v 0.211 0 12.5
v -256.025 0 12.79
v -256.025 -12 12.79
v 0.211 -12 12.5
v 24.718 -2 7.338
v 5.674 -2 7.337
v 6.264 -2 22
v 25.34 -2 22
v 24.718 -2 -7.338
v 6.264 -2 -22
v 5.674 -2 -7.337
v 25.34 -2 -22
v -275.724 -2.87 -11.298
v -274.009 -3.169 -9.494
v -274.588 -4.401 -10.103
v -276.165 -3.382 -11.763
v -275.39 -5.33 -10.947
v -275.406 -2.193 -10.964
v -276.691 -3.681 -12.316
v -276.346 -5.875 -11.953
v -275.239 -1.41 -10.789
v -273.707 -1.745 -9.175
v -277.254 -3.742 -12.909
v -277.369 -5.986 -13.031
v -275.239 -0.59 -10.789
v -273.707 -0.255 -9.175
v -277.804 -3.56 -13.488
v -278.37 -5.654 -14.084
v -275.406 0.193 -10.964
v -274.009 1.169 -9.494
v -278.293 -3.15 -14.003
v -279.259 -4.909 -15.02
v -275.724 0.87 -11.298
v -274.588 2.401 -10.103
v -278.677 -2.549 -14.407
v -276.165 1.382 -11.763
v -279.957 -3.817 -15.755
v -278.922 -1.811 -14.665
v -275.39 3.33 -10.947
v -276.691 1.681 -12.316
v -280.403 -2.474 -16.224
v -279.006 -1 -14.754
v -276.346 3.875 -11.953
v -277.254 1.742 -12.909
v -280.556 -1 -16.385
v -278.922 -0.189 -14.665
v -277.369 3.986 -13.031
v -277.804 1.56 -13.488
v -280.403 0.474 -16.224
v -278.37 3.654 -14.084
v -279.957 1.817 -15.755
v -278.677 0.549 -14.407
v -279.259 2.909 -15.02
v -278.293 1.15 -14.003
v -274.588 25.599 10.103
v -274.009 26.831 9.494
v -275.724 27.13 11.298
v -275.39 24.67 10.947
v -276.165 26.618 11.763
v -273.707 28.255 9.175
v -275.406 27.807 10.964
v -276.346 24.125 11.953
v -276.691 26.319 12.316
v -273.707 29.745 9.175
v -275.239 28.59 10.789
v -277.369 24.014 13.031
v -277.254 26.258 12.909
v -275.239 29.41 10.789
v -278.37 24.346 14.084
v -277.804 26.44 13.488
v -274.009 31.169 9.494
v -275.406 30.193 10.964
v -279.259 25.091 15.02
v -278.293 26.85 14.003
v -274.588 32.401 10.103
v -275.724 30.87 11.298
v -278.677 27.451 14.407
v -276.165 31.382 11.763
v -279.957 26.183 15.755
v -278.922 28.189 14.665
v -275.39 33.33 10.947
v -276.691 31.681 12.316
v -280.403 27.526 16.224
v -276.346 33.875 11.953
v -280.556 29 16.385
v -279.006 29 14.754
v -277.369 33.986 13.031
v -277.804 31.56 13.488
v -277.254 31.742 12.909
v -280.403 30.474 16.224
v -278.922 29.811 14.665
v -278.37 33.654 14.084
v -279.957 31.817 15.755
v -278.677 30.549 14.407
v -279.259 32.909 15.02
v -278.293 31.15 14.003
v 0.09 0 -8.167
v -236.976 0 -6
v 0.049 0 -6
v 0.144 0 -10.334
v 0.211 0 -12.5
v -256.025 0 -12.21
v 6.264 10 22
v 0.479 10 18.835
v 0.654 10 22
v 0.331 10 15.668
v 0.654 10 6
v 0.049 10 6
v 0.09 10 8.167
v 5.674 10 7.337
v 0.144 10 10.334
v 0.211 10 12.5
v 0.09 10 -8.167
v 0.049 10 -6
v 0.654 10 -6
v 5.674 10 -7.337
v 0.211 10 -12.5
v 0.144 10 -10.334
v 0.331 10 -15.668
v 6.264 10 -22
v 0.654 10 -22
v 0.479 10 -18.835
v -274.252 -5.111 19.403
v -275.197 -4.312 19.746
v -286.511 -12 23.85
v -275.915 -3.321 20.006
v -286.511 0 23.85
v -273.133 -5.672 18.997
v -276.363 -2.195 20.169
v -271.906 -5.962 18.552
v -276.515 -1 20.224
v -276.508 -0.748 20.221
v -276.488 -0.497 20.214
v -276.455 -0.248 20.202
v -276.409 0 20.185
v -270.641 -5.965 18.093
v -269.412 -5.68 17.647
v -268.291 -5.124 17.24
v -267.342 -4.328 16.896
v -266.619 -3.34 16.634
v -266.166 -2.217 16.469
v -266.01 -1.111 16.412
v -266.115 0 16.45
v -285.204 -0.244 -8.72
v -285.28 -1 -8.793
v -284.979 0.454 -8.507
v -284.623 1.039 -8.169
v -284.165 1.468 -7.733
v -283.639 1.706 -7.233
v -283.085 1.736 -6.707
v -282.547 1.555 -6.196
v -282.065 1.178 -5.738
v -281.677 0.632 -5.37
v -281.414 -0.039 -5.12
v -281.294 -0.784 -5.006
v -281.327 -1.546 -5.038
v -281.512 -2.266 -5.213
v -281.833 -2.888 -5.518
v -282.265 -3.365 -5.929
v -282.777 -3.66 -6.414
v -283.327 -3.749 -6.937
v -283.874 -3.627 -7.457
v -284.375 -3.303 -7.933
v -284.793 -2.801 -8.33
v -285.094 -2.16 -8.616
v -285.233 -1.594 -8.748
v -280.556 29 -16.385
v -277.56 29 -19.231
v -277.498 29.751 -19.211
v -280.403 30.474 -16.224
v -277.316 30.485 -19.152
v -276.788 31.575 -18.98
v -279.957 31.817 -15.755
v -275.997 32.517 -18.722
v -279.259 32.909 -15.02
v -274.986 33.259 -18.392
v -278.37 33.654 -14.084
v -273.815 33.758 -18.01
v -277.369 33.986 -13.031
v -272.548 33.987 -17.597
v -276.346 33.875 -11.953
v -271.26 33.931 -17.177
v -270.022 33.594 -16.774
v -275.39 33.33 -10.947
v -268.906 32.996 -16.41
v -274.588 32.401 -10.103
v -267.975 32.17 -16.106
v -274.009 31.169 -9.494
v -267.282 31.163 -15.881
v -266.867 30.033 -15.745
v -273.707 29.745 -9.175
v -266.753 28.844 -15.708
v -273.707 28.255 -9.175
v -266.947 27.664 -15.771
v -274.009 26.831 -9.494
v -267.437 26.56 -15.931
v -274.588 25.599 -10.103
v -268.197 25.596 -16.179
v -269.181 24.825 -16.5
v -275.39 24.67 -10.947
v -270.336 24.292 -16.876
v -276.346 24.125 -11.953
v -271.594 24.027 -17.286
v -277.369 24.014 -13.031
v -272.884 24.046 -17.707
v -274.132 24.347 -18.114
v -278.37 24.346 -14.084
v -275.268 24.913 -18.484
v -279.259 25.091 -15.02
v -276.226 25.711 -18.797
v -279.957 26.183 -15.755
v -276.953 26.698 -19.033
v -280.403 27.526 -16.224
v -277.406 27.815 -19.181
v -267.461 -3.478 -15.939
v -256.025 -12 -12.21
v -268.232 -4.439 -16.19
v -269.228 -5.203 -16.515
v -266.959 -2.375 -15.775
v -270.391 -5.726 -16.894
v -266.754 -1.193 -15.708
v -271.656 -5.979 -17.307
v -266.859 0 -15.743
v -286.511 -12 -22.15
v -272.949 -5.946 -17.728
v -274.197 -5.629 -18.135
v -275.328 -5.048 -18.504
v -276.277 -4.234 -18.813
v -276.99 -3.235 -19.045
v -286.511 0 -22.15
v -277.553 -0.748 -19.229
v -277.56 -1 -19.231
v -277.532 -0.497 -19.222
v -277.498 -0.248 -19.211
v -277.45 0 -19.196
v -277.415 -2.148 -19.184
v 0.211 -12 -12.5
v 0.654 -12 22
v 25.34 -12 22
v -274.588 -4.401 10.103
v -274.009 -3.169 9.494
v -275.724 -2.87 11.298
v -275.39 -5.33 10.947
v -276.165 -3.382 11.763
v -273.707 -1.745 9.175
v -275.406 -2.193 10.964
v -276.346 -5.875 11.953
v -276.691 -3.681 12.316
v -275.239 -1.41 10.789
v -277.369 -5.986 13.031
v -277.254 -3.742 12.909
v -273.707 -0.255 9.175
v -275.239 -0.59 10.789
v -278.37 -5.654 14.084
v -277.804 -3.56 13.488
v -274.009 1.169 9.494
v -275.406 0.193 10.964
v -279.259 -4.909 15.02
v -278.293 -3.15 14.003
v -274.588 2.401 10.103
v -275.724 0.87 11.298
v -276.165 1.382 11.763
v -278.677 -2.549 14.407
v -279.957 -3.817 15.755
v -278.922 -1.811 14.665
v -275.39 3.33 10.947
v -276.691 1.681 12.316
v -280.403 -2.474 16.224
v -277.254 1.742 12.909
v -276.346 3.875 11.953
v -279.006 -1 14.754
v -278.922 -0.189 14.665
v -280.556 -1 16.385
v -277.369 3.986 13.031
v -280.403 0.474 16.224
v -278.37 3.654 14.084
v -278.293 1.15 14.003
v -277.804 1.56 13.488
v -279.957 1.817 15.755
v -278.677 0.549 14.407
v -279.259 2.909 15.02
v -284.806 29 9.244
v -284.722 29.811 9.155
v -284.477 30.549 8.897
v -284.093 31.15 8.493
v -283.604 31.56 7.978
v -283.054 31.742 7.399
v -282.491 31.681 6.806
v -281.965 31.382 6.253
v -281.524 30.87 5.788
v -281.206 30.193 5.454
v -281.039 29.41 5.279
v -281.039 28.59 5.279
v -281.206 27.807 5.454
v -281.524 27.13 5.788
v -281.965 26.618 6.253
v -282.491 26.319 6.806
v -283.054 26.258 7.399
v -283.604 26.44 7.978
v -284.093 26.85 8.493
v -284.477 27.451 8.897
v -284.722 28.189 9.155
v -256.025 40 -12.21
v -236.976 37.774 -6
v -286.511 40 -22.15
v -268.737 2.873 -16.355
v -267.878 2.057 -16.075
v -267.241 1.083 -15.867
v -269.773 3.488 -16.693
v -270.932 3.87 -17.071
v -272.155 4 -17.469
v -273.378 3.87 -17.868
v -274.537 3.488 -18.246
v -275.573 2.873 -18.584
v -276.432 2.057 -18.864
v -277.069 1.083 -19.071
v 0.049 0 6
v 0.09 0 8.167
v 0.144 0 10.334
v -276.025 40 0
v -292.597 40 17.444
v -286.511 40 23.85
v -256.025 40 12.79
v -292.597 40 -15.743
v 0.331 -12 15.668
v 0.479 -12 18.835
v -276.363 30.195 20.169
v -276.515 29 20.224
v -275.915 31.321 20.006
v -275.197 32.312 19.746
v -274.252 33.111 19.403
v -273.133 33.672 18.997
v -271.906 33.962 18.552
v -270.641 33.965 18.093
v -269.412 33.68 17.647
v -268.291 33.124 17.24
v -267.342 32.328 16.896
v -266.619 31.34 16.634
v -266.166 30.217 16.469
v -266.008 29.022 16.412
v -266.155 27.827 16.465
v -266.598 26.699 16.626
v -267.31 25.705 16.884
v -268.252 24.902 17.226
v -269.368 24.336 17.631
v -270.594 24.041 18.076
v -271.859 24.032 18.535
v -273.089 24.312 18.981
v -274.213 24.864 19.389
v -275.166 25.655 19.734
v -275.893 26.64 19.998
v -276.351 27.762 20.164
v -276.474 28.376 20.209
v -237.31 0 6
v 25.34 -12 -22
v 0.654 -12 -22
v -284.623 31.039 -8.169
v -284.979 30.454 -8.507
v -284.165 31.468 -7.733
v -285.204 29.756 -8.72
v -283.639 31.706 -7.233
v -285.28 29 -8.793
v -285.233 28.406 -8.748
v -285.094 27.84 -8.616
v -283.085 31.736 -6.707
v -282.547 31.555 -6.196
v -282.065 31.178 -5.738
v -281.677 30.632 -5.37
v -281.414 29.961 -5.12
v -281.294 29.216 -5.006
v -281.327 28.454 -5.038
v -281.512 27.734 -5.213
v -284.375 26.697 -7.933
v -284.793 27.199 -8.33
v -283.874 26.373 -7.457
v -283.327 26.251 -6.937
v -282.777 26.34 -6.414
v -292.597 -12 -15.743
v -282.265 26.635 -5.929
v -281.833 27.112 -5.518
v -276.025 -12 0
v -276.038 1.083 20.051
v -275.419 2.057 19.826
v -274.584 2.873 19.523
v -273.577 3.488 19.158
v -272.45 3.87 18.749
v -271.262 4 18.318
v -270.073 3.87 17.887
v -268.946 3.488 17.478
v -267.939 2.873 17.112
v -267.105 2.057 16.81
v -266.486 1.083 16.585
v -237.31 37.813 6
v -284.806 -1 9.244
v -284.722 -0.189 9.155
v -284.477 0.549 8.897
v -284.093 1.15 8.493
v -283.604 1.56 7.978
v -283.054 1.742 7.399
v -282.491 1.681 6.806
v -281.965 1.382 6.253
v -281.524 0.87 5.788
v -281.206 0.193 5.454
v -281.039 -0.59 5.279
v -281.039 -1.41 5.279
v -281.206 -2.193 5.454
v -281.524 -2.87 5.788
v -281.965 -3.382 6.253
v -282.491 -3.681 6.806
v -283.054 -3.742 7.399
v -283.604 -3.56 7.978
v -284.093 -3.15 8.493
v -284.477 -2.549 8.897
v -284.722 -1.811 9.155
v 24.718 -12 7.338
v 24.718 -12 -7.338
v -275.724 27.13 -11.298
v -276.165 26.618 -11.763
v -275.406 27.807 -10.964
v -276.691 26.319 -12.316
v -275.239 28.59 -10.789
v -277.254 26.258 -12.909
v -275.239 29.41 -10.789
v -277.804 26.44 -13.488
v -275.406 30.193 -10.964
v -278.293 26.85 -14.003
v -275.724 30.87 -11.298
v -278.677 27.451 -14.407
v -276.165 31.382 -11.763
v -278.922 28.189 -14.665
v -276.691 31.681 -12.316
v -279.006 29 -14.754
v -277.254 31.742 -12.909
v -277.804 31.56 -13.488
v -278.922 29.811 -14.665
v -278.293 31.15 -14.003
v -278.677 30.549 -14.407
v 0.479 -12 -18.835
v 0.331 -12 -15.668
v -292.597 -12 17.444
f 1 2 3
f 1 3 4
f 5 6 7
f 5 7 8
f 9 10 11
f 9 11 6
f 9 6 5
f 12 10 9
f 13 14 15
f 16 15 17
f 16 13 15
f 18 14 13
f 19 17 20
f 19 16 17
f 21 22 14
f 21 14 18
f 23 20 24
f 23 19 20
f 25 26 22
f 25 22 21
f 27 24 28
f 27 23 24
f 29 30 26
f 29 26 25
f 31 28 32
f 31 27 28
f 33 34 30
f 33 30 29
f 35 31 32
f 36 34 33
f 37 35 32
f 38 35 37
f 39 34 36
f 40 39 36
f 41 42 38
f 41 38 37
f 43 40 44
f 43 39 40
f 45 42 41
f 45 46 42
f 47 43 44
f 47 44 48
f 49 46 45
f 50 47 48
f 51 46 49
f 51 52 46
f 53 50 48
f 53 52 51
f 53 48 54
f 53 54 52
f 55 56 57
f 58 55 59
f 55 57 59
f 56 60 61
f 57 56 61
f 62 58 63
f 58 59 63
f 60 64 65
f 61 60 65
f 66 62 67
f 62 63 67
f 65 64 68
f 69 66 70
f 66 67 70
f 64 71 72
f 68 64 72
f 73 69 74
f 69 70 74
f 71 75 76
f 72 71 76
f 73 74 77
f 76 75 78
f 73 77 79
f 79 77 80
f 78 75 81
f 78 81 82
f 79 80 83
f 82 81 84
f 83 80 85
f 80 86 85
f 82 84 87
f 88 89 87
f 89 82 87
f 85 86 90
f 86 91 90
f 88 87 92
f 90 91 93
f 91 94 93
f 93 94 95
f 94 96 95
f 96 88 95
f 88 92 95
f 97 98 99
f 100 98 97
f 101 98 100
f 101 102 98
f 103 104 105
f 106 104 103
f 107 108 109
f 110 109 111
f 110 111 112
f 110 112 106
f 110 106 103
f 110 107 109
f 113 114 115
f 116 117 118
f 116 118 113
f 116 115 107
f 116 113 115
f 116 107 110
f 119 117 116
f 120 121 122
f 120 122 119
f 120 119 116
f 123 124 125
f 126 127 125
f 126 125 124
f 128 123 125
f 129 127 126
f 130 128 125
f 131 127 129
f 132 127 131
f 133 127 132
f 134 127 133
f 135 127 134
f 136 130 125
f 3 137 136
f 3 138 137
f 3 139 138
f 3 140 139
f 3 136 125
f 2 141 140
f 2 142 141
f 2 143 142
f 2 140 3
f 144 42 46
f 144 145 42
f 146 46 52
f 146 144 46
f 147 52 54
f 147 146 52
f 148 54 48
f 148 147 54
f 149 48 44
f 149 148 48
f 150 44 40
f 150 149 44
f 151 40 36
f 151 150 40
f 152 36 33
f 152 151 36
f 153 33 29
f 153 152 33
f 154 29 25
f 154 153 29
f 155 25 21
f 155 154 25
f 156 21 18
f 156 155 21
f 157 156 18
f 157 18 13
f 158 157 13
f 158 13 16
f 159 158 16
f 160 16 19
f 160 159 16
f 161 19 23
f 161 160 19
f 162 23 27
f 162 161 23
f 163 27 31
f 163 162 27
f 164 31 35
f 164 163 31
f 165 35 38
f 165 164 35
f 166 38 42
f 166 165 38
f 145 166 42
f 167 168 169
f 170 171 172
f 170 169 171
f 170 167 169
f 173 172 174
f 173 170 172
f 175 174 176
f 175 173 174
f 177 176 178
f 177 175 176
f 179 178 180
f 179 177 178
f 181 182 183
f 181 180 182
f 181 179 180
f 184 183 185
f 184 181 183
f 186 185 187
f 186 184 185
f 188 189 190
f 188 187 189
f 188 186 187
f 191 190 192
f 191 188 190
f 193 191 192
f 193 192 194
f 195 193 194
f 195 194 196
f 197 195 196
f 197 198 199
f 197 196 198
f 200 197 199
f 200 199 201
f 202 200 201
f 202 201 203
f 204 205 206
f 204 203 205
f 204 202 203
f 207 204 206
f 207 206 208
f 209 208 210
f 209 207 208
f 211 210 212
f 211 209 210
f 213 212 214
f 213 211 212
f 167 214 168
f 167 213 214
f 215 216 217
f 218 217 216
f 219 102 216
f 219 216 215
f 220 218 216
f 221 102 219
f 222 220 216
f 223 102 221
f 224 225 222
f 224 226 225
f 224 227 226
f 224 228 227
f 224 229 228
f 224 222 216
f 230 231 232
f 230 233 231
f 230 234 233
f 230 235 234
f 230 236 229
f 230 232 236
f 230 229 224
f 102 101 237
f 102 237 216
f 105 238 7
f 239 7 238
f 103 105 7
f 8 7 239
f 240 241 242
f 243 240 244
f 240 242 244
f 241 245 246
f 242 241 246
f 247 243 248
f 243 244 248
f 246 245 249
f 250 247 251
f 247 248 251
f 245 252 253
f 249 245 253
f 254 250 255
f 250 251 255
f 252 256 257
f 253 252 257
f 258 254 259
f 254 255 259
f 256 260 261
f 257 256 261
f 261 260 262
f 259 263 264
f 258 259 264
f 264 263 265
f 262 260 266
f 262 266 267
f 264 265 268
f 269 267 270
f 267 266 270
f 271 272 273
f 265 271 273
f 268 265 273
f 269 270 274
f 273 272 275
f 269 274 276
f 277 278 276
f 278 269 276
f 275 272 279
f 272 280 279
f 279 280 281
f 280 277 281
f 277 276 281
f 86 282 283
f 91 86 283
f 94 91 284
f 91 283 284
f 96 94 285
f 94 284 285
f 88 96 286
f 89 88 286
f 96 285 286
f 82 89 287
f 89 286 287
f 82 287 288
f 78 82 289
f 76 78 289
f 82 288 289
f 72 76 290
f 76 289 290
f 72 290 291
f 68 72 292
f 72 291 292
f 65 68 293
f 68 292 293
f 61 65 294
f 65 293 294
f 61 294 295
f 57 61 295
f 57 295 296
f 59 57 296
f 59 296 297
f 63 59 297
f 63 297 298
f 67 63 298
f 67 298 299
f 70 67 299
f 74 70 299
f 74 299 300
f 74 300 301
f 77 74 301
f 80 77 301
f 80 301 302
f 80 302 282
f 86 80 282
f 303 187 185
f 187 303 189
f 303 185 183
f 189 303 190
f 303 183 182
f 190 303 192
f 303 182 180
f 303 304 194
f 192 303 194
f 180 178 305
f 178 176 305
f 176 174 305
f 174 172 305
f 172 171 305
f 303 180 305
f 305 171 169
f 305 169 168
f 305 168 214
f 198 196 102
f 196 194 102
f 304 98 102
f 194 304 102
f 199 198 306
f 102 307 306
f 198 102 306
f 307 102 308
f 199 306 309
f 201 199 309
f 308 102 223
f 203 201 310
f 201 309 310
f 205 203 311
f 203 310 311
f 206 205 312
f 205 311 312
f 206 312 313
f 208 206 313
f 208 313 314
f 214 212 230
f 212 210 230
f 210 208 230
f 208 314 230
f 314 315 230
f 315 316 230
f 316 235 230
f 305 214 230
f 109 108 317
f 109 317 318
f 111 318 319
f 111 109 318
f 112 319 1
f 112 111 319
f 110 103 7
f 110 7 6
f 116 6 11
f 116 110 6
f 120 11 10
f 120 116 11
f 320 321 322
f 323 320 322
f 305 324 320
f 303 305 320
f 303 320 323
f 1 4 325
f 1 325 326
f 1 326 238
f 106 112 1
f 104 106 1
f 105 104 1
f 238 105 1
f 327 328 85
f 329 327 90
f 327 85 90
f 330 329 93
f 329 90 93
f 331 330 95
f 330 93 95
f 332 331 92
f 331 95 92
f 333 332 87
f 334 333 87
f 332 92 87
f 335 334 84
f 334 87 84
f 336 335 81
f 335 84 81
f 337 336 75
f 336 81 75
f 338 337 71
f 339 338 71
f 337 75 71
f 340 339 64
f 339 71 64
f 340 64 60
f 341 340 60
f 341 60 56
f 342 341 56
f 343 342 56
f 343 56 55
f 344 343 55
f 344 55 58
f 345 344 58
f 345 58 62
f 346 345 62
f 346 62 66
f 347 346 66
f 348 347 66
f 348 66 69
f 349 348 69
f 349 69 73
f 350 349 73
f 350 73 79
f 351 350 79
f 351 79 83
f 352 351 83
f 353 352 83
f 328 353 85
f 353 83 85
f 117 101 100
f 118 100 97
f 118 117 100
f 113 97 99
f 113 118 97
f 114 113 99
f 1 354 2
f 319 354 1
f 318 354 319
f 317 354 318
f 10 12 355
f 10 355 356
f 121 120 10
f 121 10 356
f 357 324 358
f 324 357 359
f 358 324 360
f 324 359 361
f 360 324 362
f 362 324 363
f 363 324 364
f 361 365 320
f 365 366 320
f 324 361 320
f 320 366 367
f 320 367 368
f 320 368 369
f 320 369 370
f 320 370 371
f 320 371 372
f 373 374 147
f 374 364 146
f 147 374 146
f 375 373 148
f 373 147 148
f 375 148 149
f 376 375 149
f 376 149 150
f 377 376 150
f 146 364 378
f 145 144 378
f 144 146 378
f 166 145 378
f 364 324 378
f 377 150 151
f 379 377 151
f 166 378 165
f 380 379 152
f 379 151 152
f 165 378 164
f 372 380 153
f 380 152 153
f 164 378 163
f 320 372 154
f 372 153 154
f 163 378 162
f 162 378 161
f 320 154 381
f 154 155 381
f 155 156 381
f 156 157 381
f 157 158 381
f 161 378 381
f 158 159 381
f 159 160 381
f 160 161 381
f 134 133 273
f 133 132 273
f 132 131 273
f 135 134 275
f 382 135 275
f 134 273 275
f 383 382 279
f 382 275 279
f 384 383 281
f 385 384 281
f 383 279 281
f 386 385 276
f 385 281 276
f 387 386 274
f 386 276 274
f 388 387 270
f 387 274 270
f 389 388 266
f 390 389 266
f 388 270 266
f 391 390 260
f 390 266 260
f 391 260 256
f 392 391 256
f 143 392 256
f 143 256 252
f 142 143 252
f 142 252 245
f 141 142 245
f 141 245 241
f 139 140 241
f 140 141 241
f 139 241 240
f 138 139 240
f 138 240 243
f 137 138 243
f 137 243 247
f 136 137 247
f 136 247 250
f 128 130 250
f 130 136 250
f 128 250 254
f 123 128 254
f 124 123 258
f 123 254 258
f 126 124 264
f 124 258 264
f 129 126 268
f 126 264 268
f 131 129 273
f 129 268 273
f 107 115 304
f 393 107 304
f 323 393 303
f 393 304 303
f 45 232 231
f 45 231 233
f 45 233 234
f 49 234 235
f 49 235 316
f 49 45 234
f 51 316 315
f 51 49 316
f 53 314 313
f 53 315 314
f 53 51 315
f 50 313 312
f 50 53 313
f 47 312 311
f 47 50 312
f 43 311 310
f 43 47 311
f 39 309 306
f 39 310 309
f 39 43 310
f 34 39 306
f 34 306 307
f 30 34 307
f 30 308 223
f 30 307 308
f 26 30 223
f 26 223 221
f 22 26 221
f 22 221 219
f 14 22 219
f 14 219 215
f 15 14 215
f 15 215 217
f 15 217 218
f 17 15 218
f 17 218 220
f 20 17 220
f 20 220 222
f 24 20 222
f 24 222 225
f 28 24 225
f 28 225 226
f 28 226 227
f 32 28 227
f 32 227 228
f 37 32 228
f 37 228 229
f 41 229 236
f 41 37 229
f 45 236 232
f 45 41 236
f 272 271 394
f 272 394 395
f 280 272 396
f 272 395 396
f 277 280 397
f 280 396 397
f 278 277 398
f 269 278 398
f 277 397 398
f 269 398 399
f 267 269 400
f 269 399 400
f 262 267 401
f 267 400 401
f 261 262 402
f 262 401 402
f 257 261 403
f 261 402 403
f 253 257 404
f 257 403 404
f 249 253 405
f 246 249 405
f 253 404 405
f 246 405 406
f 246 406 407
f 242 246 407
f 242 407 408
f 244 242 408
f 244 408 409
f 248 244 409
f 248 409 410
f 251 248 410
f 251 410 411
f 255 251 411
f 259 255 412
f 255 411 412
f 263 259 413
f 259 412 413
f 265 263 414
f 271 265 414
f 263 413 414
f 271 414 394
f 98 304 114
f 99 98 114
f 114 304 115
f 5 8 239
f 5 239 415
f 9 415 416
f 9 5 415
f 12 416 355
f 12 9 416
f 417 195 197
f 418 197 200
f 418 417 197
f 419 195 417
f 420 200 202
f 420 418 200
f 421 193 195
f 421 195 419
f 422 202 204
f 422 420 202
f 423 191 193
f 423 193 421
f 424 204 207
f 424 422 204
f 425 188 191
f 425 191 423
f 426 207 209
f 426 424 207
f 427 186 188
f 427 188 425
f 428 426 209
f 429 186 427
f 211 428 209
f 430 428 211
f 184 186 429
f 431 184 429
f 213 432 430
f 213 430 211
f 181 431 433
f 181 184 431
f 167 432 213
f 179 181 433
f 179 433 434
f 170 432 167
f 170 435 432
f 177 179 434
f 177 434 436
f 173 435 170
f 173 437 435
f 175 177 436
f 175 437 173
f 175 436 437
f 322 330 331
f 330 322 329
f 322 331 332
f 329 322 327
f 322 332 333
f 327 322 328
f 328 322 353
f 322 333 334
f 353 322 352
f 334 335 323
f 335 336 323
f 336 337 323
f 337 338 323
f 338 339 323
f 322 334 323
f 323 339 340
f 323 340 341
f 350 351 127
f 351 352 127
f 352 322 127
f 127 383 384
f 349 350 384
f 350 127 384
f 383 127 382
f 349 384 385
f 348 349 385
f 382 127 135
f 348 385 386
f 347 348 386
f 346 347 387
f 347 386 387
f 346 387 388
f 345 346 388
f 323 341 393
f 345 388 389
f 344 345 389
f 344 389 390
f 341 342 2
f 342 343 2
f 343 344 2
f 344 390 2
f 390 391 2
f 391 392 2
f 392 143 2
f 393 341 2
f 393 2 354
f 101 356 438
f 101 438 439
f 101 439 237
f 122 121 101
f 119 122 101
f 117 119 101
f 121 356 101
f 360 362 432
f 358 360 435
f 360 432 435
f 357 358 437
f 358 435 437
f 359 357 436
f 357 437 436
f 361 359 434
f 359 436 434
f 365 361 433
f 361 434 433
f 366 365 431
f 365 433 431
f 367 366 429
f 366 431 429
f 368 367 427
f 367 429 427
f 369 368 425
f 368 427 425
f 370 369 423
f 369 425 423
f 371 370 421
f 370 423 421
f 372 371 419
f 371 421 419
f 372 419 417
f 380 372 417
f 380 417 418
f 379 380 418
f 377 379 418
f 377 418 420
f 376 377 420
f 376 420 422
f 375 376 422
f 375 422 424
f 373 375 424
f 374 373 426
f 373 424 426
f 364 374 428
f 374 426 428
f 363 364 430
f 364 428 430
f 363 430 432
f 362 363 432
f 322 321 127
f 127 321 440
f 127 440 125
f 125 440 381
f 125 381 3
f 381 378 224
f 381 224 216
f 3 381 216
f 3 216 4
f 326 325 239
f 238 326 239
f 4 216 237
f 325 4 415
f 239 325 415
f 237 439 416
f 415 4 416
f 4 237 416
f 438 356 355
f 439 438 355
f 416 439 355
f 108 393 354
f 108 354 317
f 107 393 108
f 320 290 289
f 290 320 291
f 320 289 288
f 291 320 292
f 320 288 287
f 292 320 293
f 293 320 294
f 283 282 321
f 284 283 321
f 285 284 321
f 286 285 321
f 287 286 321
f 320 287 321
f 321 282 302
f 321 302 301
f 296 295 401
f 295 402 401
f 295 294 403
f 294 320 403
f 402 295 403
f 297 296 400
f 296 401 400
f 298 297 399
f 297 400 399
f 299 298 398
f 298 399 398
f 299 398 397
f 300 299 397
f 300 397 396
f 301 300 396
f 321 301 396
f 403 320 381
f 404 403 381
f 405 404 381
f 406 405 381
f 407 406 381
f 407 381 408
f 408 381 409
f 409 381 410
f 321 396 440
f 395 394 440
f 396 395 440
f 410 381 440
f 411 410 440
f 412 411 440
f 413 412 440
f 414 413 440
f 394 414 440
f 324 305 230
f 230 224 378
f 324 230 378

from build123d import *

# Parameters (mm, degrees)
BOSS_EXTRUDE2_DEPTH          = 12
BOSS_EXTRUDE3_START          = -2
BOSS_EXTRUDE3_DEPTH          = 10
BOSS_EXTRUDE4_START          = 10
BOSS_EXTRUDE4_DEPTH          = 22
BOSS_EXTRUDE7_DEPTH          = 40
BOSS_EXTRUDE17_DEPTH         = 6
BOSS_EXTRUDE17_DEPTH_BACK    = 6
CUT_EXTRUDE_THIN1_DEPTH      = 297.279628574
CUT_EXTRUDE_THIN1_DEPTH_BACK = 297.279628574
CUT_EXTRUDE1_START           = -8
SKETCH6_R                    = 5
CUT_EXTRUDE1_DEPTH           = 231.29743947
SKETCH6_4_R                  = 2.75
CUT_EXTRUDE2_DEPTH           = 239.29743947


with BuildPart() as part:
    # Sketch2 → Boss-Extrude2 (new body)
    with BuildSketch(Plane(origin=(0, 0, 0), x_dir=(1, 0, 0), z_dir=(0, 1, 0))):
        with BuildLine():
            Line((-292.596610314, 15.743442535), (-276.02456554, 0))
            Line((-276.02456554, 0), (-292.596610314, -17.444257657))
            Line((-292.596610314, -17.444257657), (-286.510767905, -23.850407561))
            Line((-286.510767905, -23.850407561), (-256.02456554, -12.789688675))
            Line((-256.02456554, -12.789688675), (0.21086679, -12.5))
            ThreePointArc((0.21086679, -12.5), (0.401744327, -17.25142014), (0.653571446, -22))
            Line((0.653571446, -22), (6.263616969, -22))
            ThreePointArc((6.263616969, -22), (5.6, 0), (6.263616969, 22))
            Line((6.263616969, 22), (0.653571446, 22))
            ThreePointArc((0.653571446, 22), (0.401744327, 17.25142014), (0.21086679, 12.5))
            Line((0.21086679, 12.5), (-256.02456554, 12.210311325))
            Line((-256.02456554, 12.210311325), (-286.510767905, 22.149592439))
            Line((-286.510767905, 22.149592439), (-292.596610314, 15.743442535))
        make_face()
    extrude(amount=-BOSS_EXTRUDE2_DEPTH)

    # Sketch2<5> → Boss-Extrude3 (add)
    with BuildSketch(Plane(origin=(0, 0, 0), x_dir=(1, 0, 0), z_dir=(0, 1, 0)).offset(BOSS_EXTRUDE3_START)):
        with BuildLine():
            Line((25.340211435, 22), (6.263616969, 22))
            ThreePointArc((6.263616969, 22), (5.6, 0), (6.263616969, -22))
            Line((6.263616969, -22), (25.340211435, -22))
            ThreePointArc((25.340211435, -22), (24.64, 0), (25.340211435, 22))
        make_face()
    extrude(amount=-BOSS_EXTRUDE3_DEPTH)

    # Sketch2<6> → Boss-Extrude4 (add)
    with BuildSketch(Plane(origin=(0, 0, 0), x_dir=(1, 0, 0), z_dir=(0, 1, 0)).offset(BOSS_EXTRUDE4_START)):
        with BuildLine():
            ThreePointArc((0.653571446, 22), (0.401744327, 17.25142014), (0.21086679, 12.5))
            ThreePointArc((0.21086679, 12.5), (0, 0), (0.21086679, -12.5))
            ThreePointArc((0.21086679, -12.5), (0.401744327, -17.25142014), (0.653571446, -22))
            Line((0.653571446, -22), (6.263616969, -22))
            ThreePointArc((6.263616969, -22), (5.6, 0), (6.263616969, 22))
            Line((6.263616969, 22), (0.653571446, 22))
        make_face()
    extrude(amount=-BOSS_EXTRUDE4_DEPTH)

    # Sketch2<9> → Boss-Extrude7 (add)
    with BuildSketch(Plane(origin=(0, 0, 0), x_dir=(1, 0, 0), z_dir=(0, 1, 0))):
        Polygon((-292.596610314, 15.743442535), (-276.02456554, 0), (-292.596610314, -17.444257657), (-286.510767905, -23.850407561), (-219.731467486, 0.377833809), (-286.510767905, 22.149592439), align=None)
    extrude(amount=BOSS_EXTRUDE7_DEPTH)

    # Sketch4 → Boss-Extrude17 (add, two sides: drawn at the far end of the back side and taken through both)
    with BuildSketch(Plane.XY.offset(-BOSS_EXTRUDE17_DEPTH_BACK)):
        Polygon((0.653571446, 10), (-256.02456554, 40), (-256.02456554, 0), (0.653571446, 0), align=None)
    extrude(amount=BOSS_EXTRUDE17_DEPTH + BOSS_EXTRUDE17_DEPTH_BACK)

    # Sketch5 → Cut-Extrude-Thin1 (cut, two sides: drawn at the far end of the back side and taken through both)
    with BuildSketch(Plane.XY.offset(-CUT_EXTRUDE_THIN1_DEPTH_BACK)):
        Polygon((0.653571446, 10), (-256.02456554, 40), (-254.863688753, 49.932389697), (1.814448233, 19.932389697), align=None)
    extrude(amount=CUT_EXTRUDE_THIN1_DEPTH + CUT_EXTRUDE_THIN1_DEPTH_BACK, mode=Mode.SUBTRACT)

    # Sketch6 → Cut-Extrude1 (cut, through all)
    with BuildSketch(Plane(origin=(-145.085185566, 0, -137.830926288), x_dir=(-0.6887494619146907, 0, 0.724999433594416), z_dir=(-0.724999433594416, 0, -0.6887494619146907)).offset(CUT_EXTRUDE1_START)):
        with Locations((200.111770991, 29)):
            Circle(SKETCH6_R)
        with Locations((200.111770991, -1)):
            Circle(SKETCH6_R)
    cut_extrude1 = extrude(amount=-CUT_EXTRUDE1_DEPTH, mode=Mode.SUBTRACT)

    # Sketch6<4> → Cut-Extrude2 (cut, symmetric)
    with BuildSketch(Plane(origin=(-145.085185566, 0, -137.830926288), x_dir=(-0.6887494619146907, 0, 0.724999433594416), z_dir=(-0.724999433594416, 0, -0.6887494619146907))):
        with Locations((200.111770991, 29)):
            Circle(SKETCH6_4_R)
        with Locations((200.111770991, -1)):
            Circle(SKETCH6_4_R)
    cut_extrude2 = extrude(amount=CUT_EXTRUDE2_DEPTH, both=True, mode=Mode.SUBTRACT)

    # Mirror1: Cut-Extrude1, Cut-Extrude2 across plane
    add(cut_extrude1.mirror(Plane.XY), mode=Mode.SUBTRACT)
    add(cut_extrude2.mirror(Plane.XY), mode=Mode.SUBTRACT)


solid = part.part
